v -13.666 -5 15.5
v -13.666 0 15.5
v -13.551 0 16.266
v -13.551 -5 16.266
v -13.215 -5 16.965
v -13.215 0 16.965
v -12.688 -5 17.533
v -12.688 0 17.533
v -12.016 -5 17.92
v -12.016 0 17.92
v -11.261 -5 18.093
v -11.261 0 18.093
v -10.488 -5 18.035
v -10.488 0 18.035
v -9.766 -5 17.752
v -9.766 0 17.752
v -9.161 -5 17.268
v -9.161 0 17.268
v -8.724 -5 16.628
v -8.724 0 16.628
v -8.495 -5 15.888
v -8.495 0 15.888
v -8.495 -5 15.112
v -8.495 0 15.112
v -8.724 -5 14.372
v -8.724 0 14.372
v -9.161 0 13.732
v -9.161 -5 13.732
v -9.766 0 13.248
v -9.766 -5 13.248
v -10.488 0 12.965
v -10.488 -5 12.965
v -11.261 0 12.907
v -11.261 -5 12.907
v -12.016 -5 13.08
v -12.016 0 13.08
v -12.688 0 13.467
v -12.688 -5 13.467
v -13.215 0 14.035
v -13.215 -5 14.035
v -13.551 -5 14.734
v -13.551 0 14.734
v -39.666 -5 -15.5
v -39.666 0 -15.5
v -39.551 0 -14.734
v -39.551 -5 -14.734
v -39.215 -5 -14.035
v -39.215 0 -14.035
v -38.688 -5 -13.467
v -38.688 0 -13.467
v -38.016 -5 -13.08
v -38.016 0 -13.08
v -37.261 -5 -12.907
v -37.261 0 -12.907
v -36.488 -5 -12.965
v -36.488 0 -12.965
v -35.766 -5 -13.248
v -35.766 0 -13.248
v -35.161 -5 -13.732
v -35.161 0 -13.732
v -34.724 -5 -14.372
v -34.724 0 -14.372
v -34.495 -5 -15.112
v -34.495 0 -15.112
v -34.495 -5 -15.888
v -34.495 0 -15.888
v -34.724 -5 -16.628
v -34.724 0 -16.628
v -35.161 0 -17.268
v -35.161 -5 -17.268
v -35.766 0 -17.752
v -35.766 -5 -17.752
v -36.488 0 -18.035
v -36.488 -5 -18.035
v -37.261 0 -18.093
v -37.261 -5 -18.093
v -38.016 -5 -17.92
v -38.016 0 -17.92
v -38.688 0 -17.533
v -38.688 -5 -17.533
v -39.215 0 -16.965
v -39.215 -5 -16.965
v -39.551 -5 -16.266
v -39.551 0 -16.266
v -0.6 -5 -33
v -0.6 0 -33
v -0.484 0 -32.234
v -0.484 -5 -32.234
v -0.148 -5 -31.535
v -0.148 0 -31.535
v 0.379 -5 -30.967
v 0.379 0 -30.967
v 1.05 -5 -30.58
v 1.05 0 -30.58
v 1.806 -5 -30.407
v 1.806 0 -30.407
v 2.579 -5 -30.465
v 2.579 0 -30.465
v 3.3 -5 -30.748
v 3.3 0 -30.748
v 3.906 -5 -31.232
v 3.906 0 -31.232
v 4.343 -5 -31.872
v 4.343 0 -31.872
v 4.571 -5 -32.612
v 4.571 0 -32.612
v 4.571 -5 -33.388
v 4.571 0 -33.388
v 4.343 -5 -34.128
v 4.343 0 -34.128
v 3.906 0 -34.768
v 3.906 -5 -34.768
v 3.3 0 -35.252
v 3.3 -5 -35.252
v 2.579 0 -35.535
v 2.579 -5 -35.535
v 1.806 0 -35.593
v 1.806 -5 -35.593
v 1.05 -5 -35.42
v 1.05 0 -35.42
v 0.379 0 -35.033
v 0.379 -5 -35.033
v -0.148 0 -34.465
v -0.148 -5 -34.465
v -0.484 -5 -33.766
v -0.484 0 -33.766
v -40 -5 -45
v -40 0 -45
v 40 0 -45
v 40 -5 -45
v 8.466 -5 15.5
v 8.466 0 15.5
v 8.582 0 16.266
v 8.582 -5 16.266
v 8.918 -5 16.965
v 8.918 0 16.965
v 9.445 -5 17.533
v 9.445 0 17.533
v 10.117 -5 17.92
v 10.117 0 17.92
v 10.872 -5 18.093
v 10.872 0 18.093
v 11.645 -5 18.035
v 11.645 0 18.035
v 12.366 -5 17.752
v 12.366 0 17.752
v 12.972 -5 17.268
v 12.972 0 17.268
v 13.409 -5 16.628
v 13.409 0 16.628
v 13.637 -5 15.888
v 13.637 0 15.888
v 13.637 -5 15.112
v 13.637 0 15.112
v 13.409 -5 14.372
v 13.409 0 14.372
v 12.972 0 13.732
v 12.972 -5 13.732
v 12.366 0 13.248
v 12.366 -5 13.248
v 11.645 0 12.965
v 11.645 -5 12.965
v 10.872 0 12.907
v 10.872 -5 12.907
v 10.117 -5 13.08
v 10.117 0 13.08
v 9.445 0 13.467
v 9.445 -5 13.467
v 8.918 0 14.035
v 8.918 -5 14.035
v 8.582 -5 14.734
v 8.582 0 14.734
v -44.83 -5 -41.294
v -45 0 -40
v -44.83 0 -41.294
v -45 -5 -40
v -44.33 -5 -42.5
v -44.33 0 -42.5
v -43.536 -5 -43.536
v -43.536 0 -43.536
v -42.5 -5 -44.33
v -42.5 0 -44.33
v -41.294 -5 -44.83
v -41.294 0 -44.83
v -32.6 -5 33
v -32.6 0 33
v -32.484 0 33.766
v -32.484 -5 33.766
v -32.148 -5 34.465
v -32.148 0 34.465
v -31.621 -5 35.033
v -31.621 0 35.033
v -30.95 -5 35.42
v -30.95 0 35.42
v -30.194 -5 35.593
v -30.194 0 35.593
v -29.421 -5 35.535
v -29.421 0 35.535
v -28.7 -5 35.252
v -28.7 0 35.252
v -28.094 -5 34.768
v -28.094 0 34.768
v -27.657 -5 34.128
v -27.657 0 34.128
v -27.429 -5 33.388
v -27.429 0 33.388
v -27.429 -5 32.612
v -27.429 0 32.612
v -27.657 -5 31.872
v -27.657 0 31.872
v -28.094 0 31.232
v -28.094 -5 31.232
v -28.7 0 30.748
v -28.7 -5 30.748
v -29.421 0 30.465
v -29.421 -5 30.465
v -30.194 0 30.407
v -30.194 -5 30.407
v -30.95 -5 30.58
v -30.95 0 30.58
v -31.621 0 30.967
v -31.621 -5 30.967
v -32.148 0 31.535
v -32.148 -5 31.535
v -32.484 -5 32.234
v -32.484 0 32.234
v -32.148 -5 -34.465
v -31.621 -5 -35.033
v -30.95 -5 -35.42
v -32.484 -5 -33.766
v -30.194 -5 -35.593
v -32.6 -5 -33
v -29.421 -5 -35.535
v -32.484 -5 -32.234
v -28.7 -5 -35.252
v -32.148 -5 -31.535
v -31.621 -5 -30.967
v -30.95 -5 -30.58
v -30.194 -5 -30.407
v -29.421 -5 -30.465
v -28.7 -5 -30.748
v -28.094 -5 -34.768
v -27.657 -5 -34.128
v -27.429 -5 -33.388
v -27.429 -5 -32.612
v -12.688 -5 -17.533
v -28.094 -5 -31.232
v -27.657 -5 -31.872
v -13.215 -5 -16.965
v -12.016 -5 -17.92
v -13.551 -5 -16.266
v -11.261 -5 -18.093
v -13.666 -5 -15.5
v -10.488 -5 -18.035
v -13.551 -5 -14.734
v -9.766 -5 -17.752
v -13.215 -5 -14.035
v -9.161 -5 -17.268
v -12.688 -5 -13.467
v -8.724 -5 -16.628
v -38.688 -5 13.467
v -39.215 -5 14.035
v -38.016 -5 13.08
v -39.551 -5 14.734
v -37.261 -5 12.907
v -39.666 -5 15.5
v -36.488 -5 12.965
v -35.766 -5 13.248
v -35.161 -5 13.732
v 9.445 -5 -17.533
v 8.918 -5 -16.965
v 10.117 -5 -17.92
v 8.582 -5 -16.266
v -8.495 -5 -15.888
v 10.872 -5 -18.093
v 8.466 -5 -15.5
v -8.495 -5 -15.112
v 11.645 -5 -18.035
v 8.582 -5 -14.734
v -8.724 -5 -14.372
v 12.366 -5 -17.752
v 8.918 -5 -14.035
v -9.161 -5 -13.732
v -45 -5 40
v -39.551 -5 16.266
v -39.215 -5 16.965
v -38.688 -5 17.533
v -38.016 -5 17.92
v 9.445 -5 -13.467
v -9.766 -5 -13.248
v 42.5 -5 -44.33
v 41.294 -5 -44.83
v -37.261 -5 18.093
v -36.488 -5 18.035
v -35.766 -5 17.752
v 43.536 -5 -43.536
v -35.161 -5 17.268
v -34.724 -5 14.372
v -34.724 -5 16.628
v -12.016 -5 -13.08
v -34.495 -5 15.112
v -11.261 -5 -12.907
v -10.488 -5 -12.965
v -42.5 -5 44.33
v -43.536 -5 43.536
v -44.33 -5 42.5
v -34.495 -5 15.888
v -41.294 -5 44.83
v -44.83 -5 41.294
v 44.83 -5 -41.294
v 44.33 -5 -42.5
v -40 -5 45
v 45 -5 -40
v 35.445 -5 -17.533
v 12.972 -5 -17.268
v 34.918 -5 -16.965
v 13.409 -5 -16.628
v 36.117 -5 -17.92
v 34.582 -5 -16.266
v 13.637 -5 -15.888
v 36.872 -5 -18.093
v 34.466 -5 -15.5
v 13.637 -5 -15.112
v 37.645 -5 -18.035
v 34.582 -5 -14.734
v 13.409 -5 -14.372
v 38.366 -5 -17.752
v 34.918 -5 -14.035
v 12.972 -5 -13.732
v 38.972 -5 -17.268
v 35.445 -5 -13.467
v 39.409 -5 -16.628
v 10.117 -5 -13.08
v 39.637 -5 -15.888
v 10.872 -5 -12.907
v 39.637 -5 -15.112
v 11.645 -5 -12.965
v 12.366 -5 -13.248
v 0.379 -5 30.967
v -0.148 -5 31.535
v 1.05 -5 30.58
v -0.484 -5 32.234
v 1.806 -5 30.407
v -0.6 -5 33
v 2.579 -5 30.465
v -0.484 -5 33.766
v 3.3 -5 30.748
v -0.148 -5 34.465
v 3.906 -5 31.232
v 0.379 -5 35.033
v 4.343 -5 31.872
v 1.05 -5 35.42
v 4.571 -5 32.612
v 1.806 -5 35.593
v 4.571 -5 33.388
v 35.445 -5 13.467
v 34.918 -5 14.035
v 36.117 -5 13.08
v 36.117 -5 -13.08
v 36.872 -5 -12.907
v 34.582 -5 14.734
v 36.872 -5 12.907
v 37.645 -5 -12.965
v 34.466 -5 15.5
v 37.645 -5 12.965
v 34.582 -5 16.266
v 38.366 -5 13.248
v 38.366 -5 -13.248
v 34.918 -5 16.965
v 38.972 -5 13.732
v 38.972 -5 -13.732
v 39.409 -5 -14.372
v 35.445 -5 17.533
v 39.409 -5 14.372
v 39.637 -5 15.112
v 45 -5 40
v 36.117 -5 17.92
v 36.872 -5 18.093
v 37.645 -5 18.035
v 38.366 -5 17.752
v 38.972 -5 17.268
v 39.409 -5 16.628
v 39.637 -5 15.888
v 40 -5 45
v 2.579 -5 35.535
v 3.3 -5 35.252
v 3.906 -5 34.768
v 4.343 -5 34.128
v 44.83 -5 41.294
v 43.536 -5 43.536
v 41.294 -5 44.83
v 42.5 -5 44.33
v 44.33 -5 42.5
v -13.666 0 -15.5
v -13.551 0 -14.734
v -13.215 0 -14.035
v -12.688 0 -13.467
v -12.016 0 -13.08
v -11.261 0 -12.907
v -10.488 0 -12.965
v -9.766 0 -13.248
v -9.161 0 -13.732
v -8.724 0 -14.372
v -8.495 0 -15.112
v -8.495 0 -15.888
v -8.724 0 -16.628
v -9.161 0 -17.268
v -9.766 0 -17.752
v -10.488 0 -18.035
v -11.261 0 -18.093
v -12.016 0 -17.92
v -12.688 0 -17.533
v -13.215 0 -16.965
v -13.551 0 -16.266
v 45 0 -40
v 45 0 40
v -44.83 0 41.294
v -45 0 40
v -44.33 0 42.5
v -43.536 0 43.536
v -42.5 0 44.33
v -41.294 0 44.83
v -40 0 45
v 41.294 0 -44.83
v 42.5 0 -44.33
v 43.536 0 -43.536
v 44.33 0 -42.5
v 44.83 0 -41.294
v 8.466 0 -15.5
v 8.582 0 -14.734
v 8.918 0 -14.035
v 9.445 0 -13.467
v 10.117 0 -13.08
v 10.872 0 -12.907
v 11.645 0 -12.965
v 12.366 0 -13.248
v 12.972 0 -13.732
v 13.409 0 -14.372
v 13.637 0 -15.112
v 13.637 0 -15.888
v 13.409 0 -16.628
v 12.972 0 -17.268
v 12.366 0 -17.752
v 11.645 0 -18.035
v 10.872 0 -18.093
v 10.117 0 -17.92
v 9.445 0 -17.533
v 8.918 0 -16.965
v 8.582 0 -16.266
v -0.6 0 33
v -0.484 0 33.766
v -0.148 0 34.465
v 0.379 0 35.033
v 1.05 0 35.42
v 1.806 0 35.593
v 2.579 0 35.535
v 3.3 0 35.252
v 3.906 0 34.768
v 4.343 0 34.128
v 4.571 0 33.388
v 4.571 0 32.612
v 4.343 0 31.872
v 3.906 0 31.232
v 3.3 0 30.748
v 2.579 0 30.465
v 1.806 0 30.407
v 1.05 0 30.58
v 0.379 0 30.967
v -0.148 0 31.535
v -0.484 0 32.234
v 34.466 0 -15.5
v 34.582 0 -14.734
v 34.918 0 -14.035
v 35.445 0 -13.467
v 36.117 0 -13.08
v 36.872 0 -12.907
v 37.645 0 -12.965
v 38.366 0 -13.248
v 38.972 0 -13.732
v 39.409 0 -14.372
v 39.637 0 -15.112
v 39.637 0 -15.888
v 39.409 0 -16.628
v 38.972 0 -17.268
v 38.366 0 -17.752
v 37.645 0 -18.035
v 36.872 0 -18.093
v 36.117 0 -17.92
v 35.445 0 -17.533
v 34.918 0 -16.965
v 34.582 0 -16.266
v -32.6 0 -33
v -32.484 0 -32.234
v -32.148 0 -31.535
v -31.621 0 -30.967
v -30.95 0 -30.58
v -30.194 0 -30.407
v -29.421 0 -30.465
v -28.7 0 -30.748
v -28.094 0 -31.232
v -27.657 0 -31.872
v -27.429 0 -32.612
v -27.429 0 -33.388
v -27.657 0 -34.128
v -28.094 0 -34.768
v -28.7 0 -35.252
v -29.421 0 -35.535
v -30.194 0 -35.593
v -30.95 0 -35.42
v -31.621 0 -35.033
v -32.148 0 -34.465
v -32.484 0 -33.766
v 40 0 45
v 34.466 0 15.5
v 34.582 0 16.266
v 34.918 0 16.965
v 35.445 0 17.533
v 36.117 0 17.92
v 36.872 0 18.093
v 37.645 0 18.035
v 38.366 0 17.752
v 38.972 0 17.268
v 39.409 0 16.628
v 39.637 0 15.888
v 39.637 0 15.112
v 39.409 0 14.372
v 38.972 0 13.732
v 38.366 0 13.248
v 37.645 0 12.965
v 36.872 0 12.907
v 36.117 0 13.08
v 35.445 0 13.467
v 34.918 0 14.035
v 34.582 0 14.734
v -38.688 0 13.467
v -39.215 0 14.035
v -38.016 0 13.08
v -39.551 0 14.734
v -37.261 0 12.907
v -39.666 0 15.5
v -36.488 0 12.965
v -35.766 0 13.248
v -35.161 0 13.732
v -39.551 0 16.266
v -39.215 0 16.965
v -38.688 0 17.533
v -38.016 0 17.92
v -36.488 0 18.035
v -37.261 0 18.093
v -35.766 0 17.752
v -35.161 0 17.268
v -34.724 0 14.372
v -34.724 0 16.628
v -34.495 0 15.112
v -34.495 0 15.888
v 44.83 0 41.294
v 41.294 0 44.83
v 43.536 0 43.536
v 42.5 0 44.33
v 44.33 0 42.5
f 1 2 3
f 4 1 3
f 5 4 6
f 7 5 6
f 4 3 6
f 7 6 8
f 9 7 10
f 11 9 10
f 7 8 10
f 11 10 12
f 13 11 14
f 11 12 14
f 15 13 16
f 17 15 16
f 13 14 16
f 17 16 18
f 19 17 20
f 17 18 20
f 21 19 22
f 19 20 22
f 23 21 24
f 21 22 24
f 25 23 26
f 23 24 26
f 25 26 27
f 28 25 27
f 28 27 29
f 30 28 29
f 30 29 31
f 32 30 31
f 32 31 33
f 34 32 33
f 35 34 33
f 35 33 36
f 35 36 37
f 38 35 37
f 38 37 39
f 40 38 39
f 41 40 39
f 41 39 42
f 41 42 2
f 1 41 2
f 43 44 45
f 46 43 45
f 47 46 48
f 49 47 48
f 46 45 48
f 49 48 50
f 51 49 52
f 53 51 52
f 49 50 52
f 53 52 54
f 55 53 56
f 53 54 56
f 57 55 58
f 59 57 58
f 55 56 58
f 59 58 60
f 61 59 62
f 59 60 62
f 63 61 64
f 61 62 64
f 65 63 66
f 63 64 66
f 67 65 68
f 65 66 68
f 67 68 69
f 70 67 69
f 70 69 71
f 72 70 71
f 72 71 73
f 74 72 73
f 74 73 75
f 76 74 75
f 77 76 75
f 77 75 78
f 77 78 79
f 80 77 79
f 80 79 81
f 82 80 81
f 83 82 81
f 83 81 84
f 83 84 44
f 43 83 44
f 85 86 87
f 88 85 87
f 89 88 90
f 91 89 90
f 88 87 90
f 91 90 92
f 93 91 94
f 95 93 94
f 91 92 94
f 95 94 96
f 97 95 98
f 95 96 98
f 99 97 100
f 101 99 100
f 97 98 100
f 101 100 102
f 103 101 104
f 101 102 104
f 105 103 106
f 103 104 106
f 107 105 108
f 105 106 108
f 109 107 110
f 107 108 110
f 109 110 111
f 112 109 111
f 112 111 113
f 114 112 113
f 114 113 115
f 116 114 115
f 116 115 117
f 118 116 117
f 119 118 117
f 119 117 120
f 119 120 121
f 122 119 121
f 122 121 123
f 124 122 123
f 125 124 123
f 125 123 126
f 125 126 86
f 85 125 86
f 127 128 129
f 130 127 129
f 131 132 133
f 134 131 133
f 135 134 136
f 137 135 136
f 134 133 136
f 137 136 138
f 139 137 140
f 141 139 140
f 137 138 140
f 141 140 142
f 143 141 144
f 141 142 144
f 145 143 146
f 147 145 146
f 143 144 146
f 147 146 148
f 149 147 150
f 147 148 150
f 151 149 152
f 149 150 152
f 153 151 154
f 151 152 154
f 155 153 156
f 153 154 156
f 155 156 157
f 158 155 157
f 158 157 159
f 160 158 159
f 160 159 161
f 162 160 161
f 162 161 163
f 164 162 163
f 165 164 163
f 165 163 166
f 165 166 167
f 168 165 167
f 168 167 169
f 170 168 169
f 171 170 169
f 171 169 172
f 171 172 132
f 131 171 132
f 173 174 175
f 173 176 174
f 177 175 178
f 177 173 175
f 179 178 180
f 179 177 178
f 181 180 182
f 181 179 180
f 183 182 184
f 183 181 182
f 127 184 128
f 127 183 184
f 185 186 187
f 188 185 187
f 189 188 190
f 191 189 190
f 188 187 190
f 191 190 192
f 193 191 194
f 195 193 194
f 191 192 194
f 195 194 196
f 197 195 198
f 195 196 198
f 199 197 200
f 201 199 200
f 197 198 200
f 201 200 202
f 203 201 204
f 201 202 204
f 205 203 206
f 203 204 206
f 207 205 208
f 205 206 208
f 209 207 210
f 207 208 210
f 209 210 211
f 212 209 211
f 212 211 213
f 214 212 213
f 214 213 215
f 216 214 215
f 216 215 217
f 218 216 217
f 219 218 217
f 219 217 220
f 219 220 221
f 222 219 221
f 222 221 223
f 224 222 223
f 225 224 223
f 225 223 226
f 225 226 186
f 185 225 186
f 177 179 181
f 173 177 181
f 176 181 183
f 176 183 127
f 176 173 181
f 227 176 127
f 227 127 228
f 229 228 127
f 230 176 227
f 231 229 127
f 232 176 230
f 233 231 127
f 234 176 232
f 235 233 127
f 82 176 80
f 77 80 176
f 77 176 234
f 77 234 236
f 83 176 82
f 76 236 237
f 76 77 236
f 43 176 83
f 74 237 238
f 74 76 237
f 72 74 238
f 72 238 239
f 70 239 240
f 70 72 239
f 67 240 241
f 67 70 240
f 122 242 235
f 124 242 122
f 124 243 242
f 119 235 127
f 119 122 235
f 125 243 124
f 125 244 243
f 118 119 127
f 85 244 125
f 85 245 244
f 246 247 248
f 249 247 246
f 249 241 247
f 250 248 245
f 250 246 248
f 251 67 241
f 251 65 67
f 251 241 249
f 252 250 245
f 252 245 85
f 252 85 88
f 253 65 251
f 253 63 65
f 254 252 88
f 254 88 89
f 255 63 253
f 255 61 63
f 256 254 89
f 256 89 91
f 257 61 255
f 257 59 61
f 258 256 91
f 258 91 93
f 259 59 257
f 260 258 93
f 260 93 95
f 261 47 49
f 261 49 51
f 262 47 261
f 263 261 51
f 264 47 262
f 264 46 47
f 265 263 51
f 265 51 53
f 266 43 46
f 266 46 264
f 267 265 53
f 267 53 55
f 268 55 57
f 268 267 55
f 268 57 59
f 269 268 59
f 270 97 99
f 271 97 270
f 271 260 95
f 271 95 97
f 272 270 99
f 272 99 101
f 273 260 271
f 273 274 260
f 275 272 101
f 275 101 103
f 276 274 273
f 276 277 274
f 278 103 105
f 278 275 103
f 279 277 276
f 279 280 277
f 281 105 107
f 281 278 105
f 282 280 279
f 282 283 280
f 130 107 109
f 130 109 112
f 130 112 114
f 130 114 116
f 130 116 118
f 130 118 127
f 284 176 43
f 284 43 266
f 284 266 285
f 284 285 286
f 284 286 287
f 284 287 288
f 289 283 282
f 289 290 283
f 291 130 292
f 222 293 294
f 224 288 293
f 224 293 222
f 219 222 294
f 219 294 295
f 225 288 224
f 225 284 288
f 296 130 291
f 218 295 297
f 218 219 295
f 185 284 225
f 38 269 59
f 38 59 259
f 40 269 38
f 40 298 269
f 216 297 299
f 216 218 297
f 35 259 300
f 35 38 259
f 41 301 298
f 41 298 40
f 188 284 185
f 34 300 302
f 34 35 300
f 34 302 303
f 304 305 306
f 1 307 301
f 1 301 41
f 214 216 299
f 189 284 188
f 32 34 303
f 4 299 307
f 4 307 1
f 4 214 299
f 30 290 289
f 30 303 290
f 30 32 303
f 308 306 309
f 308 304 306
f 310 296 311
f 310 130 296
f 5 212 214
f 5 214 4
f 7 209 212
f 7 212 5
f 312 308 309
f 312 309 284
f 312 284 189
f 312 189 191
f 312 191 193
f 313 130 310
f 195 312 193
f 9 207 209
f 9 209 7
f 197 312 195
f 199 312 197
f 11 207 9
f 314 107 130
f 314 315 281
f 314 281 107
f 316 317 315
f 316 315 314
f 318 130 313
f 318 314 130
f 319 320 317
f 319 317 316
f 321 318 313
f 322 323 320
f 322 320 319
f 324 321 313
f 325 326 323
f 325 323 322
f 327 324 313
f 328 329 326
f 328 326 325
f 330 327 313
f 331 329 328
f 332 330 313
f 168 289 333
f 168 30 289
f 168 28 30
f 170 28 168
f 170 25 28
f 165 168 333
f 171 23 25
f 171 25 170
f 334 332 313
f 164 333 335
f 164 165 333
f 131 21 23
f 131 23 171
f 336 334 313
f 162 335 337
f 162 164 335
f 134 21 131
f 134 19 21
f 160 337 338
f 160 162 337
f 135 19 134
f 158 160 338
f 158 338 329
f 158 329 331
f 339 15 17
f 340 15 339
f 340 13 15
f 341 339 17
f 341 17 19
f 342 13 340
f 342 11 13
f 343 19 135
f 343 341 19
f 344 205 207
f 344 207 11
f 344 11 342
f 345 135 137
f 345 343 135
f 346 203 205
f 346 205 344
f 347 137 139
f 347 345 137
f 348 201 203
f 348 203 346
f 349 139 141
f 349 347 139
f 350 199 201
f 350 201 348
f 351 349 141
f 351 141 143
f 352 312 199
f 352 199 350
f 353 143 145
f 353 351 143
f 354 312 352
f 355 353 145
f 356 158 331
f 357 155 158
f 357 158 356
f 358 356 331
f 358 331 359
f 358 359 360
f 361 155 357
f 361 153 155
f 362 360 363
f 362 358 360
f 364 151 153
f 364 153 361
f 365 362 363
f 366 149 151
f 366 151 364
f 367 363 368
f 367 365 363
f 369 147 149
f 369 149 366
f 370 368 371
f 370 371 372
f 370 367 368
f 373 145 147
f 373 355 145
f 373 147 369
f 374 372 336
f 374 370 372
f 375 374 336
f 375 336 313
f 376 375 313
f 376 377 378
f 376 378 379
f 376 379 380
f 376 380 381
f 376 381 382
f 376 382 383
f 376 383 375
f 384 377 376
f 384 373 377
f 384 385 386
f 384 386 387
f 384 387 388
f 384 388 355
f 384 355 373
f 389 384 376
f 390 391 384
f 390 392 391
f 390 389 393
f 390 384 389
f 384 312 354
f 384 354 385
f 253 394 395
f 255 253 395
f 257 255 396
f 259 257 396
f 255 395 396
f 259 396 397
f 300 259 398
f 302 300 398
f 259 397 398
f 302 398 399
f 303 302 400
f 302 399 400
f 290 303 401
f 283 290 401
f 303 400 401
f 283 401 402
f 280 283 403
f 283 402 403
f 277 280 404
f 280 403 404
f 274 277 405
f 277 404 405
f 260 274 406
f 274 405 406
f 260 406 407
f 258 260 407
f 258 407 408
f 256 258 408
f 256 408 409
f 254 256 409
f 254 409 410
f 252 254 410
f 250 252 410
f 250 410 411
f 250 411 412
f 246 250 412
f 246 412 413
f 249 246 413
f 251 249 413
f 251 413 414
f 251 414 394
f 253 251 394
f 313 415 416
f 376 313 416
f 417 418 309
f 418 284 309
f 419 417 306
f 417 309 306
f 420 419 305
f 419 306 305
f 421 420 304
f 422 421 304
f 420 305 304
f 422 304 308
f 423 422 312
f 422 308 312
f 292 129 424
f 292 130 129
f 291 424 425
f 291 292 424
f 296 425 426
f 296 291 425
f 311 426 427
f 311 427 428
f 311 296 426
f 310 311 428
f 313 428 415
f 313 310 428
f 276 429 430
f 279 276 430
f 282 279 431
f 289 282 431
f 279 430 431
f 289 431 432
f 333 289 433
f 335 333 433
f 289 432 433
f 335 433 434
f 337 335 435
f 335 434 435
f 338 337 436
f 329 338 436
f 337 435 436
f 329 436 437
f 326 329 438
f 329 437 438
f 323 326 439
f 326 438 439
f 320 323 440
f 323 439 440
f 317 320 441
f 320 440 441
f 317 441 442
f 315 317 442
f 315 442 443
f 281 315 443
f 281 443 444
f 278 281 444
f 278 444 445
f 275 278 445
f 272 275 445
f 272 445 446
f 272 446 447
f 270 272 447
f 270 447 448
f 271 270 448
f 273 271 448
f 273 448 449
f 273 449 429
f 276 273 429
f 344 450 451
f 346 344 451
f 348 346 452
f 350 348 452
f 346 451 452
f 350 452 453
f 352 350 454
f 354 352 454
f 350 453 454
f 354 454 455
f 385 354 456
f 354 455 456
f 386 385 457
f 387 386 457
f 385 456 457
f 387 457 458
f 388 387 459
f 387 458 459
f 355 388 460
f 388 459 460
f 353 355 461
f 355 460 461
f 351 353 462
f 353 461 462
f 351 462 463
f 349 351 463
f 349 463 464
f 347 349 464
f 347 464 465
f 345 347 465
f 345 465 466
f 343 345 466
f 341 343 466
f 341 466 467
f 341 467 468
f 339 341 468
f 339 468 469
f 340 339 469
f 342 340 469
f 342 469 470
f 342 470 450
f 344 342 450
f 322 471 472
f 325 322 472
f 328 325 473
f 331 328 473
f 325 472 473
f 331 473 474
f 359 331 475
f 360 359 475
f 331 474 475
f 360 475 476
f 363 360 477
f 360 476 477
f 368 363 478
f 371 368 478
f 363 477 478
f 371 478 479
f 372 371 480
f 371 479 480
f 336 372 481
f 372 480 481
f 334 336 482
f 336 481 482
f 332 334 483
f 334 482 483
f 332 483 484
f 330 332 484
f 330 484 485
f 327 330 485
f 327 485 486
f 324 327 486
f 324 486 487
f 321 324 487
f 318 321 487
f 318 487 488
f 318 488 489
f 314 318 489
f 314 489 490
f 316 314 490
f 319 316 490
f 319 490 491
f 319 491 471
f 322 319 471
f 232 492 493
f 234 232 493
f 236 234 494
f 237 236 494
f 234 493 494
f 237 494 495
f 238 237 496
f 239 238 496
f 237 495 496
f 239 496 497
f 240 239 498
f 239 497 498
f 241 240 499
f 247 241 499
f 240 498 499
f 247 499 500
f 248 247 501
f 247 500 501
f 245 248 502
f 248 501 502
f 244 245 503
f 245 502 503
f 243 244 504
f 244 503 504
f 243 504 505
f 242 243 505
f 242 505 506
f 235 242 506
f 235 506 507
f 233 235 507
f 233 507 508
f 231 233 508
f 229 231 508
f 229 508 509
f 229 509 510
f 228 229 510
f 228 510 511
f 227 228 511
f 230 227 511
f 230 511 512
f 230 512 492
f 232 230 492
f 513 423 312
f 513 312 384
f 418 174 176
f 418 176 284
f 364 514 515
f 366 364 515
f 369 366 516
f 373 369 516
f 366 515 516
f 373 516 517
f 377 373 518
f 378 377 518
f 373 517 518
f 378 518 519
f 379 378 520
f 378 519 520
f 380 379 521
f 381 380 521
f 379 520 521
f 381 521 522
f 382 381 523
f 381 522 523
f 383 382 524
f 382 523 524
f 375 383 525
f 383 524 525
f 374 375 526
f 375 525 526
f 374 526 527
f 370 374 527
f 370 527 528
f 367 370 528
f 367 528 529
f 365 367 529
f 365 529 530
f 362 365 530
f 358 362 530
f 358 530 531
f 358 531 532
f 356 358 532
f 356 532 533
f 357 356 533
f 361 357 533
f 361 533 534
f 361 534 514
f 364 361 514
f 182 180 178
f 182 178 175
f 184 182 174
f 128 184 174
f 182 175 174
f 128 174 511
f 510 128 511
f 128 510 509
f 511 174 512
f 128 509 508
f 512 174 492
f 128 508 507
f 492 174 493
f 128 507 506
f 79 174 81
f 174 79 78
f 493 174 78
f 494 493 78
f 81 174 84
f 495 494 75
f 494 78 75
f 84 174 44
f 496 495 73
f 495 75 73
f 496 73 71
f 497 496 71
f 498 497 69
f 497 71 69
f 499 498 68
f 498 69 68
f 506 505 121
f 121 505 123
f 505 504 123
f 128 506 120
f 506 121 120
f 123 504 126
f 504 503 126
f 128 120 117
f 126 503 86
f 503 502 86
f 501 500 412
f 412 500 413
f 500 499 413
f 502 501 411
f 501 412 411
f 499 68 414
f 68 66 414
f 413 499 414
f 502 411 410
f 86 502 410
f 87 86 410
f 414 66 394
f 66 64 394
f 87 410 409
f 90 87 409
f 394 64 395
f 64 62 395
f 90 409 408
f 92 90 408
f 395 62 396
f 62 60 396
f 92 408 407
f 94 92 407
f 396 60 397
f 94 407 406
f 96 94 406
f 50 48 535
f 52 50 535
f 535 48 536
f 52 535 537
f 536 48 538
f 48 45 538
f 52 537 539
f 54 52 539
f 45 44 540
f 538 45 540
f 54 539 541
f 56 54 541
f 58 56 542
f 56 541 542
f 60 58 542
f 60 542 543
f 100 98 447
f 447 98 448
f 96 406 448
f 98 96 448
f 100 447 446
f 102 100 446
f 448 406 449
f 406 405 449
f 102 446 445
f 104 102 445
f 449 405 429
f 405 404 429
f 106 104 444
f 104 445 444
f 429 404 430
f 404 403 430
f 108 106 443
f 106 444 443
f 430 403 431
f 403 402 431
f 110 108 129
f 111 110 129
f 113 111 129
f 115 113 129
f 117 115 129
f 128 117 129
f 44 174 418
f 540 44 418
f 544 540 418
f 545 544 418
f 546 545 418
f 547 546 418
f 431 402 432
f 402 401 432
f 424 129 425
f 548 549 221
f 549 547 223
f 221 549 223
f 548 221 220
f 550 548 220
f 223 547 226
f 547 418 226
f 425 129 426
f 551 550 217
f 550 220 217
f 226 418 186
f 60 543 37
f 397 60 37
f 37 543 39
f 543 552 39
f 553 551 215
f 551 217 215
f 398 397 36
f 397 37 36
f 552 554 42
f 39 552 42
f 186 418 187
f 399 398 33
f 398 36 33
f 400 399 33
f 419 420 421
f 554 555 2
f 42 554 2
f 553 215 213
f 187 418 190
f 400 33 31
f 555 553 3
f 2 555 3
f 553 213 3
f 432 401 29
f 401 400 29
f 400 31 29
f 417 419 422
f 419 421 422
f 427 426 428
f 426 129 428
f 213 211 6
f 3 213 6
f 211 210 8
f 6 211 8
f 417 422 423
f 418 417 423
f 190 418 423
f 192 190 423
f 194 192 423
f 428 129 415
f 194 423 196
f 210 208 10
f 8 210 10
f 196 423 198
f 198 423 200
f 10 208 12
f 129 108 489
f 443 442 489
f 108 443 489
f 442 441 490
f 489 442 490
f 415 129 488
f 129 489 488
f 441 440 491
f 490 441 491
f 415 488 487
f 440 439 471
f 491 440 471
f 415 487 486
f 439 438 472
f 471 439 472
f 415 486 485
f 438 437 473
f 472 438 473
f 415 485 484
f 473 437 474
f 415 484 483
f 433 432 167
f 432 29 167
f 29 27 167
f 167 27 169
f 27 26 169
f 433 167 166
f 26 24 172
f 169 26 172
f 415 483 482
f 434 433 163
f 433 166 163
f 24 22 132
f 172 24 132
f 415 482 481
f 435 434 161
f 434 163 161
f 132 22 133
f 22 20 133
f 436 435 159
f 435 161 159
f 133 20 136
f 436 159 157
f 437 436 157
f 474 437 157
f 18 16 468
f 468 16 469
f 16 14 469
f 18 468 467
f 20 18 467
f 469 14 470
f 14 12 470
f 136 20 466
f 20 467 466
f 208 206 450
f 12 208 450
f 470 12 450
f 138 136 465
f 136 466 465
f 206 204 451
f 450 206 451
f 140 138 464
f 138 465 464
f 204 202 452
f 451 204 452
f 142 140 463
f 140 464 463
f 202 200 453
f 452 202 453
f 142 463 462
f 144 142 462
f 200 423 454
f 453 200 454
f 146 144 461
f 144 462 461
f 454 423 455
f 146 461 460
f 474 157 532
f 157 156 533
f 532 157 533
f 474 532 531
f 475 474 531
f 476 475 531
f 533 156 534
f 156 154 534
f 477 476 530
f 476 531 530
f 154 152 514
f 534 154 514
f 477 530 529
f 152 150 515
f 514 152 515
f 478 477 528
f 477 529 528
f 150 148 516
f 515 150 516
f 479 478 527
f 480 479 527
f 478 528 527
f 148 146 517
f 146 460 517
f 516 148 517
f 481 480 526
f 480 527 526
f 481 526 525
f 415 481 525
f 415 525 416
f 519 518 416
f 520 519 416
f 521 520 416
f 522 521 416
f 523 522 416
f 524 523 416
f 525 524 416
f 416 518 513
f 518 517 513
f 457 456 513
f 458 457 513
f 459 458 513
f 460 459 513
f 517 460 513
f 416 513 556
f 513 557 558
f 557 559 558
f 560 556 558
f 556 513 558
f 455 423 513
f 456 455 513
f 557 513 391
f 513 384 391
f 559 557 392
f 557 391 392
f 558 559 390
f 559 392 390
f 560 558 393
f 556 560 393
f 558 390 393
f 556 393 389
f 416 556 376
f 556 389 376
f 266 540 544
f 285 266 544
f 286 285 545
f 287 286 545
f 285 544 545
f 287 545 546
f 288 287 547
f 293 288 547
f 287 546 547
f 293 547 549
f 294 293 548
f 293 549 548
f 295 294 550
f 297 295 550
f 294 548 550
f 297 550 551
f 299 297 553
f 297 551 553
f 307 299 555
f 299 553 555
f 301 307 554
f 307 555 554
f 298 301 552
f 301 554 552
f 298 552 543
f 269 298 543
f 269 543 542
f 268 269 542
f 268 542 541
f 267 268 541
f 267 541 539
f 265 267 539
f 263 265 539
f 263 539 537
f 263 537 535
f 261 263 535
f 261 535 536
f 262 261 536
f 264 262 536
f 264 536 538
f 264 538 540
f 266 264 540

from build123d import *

# Parameters (mm, degrees)
F0_W     = 90
F0_H     = 90
F1_DEPTH = 5
F3_D     = 5.2
F5_D     = 5.2
F6_R     = 5


with BuildPart() as f1:
    # F0 (on Front) → F1 (new body)
    with BuildSketch(Plane.XZ):
        Rectangle(F0_W, F0_H)
    extrude(amount=F1_DEPTH)

    # F3 (through all)
    with Locations(Plane.XZ.offset(5)):
        with Locations((-37.066457, 15.5), (-11.066457, 15.5), (11.066457, 15.5), (37.066457, 15.5), (37.066457, -15.5), (11.066457, -15.5), (-11.066457, -15.5), (-37.066457, -15.5)):
            Hole(F3_D / 2)

    # F5 (through all)
    with Locations(Plane.XZ.offset(5)):
        with Locations((-30, 33), (2, 33), (2, -33), (-30, -33)):
            Hole(F5_D / 2)

    # F6
    f6_edges = [f1.edges().sort_by_distance(p)[0] for p in [
        (-45, -2.5, 45),
        (-45, -2.5, -45),
        (45, -2.5, 45),
        (45, -2.5, -45),
    ]]
    fillet(f6_edges, radius=F6_R)


solid = f1.part
